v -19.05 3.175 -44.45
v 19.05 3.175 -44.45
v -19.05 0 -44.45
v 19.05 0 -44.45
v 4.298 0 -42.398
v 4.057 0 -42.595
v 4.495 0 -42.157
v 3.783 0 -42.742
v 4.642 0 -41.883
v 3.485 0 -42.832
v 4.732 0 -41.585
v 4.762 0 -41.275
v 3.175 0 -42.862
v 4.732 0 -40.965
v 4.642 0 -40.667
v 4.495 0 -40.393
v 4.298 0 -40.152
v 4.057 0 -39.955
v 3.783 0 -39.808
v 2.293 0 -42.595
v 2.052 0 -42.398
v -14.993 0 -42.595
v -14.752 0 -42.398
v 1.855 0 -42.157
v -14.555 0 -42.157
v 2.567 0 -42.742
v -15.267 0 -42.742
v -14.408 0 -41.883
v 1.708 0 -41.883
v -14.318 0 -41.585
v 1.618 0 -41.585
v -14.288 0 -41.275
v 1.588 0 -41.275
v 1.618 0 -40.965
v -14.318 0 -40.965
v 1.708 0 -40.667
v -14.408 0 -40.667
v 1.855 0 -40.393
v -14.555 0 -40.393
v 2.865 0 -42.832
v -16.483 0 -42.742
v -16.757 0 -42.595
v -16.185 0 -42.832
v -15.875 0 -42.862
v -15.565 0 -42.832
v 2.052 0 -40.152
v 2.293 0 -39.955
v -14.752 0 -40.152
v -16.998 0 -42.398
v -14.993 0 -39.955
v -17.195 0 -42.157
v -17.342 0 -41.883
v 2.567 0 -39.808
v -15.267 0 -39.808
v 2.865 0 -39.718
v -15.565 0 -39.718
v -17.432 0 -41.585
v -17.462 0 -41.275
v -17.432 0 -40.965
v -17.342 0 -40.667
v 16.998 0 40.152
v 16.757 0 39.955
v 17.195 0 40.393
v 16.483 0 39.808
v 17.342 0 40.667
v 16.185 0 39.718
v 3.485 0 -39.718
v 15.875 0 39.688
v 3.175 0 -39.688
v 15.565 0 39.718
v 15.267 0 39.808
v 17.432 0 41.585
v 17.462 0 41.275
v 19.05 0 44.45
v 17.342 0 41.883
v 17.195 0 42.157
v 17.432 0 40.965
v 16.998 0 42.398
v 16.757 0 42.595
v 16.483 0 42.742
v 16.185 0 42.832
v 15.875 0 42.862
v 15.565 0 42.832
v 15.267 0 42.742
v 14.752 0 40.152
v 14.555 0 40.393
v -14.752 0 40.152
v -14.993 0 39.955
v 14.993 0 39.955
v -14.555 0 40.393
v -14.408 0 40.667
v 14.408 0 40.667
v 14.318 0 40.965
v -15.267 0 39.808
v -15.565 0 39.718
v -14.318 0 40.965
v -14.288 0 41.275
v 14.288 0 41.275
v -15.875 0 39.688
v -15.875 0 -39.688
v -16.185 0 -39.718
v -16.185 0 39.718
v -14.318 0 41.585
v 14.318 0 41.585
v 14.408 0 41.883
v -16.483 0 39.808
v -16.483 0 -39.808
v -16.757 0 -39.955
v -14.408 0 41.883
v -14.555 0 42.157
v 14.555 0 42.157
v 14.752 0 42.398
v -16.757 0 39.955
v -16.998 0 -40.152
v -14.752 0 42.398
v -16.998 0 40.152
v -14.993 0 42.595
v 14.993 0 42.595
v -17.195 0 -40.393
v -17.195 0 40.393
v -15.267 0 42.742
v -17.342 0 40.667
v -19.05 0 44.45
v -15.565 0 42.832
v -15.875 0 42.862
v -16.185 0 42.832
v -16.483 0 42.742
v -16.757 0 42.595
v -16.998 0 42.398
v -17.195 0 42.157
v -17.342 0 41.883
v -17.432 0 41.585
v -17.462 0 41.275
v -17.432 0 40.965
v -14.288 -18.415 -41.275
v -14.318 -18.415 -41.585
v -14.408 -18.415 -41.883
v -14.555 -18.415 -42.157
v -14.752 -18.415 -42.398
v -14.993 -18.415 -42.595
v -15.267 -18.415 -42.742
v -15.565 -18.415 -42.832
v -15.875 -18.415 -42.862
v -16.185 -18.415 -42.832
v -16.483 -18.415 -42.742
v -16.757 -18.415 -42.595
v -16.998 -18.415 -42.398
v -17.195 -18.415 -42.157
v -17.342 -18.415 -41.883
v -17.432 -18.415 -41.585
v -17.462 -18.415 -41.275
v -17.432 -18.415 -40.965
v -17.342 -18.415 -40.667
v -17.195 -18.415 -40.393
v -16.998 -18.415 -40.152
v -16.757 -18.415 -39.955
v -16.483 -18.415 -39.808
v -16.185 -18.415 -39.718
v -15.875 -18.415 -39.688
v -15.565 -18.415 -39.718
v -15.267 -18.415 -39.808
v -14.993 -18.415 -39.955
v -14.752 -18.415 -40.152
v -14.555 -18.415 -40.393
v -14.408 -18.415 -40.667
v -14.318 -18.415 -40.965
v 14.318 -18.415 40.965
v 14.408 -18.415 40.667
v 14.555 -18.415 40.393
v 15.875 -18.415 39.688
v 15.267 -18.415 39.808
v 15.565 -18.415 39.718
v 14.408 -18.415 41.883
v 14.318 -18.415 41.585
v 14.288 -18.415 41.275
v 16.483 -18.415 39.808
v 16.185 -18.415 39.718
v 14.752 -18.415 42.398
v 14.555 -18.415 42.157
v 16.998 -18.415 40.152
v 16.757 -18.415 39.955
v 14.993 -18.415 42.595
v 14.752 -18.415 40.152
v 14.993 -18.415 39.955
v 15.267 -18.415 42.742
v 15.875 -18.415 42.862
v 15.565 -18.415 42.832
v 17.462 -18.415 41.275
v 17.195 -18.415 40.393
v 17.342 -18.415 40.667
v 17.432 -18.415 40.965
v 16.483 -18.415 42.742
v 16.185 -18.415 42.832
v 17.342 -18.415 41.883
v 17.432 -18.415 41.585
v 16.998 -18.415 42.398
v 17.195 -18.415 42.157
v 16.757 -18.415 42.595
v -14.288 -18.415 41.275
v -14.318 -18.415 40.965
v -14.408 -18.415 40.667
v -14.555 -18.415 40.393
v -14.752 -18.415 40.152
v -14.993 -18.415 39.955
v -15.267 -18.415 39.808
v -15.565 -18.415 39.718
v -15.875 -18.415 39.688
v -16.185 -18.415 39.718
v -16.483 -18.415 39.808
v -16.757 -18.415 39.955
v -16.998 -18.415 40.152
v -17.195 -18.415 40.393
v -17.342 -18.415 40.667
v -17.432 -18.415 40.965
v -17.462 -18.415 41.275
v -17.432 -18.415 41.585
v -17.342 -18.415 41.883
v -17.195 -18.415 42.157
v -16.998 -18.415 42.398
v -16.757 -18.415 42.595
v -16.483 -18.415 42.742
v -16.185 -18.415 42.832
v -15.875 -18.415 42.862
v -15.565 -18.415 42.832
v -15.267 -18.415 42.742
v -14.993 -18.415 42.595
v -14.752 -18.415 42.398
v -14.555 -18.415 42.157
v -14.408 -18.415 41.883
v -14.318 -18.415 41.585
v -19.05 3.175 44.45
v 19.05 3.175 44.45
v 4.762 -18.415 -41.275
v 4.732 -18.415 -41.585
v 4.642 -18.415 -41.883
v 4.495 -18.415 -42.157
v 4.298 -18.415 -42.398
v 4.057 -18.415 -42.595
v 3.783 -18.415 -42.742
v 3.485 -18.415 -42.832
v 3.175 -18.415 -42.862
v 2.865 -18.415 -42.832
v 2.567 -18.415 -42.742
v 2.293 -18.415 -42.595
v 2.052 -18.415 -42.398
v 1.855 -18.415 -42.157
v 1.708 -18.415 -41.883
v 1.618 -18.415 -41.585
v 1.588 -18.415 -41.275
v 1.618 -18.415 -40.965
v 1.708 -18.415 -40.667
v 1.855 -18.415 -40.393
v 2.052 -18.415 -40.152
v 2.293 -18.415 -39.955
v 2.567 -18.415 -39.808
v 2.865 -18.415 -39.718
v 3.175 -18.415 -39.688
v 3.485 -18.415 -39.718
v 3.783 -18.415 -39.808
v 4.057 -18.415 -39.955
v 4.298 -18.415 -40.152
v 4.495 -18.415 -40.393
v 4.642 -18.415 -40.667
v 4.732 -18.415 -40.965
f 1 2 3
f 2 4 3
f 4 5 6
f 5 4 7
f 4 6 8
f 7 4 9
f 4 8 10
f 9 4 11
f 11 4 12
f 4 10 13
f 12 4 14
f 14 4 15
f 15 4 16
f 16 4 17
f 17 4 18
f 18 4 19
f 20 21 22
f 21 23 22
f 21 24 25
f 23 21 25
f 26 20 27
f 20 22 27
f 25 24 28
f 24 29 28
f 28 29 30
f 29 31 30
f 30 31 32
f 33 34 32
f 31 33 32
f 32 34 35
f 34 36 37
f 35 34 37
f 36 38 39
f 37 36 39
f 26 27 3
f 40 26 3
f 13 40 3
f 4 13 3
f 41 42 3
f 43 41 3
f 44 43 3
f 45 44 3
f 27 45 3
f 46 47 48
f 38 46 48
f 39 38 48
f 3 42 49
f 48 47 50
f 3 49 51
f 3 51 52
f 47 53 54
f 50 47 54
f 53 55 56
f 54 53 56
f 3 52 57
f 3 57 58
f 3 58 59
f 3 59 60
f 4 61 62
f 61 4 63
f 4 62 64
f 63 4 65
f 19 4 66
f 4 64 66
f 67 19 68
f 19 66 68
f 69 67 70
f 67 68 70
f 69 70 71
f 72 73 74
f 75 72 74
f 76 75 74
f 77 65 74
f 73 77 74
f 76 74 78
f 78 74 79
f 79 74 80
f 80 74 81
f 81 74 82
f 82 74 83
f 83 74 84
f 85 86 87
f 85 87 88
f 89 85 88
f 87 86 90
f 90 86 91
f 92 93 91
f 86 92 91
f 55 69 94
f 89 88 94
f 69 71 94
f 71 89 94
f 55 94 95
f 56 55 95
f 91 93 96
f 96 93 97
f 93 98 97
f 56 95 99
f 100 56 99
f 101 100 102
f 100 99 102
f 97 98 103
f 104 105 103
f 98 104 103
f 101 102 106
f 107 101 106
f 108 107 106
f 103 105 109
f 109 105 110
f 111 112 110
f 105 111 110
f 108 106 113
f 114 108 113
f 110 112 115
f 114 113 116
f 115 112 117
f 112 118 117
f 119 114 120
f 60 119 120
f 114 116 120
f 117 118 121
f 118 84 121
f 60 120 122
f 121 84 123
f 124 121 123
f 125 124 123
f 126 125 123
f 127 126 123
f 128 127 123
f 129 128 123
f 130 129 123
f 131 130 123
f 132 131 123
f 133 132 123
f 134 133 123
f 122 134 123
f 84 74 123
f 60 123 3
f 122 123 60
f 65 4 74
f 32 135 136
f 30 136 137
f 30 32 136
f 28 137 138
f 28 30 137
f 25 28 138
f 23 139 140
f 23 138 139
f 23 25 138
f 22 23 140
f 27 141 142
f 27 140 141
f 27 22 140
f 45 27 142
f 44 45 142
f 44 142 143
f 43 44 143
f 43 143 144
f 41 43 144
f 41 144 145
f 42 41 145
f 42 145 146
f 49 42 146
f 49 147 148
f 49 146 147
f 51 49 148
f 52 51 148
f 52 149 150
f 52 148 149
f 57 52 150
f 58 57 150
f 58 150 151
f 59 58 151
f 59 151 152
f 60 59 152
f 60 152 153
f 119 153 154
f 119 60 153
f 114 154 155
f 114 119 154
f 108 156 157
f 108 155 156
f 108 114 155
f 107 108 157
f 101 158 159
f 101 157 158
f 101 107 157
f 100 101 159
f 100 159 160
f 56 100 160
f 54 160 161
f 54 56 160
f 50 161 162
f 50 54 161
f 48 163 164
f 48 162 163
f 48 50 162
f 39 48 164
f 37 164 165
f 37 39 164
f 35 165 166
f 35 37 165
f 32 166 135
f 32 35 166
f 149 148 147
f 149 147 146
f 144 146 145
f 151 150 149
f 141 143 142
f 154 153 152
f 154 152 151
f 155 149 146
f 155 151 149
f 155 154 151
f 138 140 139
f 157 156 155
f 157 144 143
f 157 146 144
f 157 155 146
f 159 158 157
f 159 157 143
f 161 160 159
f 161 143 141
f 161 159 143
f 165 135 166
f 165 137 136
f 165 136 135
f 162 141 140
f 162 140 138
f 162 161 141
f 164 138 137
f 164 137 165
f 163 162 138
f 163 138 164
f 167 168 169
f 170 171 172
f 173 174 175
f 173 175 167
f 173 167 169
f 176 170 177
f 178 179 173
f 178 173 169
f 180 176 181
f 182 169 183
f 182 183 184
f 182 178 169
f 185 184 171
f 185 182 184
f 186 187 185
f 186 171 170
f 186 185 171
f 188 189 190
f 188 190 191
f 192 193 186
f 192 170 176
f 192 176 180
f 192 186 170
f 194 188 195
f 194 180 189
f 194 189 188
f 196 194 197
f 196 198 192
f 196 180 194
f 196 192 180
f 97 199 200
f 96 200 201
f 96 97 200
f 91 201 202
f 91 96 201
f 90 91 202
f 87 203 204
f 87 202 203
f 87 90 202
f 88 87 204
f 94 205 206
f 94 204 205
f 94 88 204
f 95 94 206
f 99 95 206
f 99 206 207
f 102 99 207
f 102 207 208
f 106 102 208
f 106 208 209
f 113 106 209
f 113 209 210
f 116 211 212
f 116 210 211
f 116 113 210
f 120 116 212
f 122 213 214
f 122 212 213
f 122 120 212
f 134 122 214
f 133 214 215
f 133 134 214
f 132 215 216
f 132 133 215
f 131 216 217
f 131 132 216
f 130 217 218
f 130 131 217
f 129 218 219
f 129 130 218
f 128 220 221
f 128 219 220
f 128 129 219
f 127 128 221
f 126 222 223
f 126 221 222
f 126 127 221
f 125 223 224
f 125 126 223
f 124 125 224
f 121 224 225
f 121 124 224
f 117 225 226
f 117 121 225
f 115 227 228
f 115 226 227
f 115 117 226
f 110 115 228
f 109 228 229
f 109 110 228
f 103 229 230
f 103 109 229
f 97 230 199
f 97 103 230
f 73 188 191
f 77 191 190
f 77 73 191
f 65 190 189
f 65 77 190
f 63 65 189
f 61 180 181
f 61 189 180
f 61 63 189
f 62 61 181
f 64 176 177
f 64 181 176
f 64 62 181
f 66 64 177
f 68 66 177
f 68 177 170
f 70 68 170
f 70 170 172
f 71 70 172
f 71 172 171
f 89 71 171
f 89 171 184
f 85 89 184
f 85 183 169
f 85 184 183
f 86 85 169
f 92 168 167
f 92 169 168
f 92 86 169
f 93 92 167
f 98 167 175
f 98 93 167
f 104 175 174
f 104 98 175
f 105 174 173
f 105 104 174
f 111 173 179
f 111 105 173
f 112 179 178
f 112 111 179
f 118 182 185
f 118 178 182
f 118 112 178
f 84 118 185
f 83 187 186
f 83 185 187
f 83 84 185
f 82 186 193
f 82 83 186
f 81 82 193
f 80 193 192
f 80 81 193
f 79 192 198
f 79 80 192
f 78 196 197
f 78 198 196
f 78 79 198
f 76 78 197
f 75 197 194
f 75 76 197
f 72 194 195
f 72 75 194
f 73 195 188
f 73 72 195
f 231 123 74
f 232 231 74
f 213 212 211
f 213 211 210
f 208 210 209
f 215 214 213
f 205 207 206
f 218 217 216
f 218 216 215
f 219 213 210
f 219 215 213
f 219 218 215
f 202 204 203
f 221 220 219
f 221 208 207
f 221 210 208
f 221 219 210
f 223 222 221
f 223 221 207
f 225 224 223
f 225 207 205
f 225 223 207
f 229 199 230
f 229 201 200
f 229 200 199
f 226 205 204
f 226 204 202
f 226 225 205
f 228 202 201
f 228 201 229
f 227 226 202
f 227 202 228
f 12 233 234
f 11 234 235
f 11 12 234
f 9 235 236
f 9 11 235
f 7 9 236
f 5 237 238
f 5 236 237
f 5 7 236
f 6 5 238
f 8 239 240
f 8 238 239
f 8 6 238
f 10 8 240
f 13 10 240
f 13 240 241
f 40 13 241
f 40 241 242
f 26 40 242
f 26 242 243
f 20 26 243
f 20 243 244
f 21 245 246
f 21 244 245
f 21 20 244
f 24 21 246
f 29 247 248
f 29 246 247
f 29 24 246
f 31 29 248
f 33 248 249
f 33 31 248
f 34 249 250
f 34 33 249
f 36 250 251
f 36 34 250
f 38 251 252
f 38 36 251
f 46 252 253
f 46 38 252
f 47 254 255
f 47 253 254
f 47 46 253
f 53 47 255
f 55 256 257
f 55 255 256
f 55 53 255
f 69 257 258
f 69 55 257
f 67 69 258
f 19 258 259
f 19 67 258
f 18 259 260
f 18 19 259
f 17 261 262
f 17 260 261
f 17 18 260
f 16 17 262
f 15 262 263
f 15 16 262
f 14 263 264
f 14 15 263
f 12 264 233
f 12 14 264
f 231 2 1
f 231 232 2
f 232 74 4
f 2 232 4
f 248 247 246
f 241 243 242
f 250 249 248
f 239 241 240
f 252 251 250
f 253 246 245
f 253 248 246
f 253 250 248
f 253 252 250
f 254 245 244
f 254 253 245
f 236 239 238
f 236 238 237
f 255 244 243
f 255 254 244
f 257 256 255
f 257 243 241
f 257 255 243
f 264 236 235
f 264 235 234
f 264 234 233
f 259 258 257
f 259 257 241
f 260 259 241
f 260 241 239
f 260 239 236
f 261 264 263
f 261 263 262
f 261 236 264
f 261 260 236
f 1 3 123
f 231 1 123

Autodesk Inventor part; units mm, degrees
ref_plane "YZ Plane" through (0, 0, 0) normal (1, 0, 0) x (0, 1, 0)
ref_plane "XZ Plane" through (0, 0, 0) normal (0, 1, 0) x (-1, 0, 0)
ref_plane "XY Plane" through (0, 0, 0) normal (0, 0, 1) x (1, 0, 0)
sketch "Sketch1" plane through (0, 0, 0) normal (0, 1, 0) x (-1, 0, 0)
  line L0 (19.05, 44.45) -> (-19.05, 44.45)
  line L1 (-19.05, 44.45) -> (-19.05, -44.45)
  line L2 (-19.05, -44.45) -> (19.05, -44.45)
  line L3 (19.05, -44.45) -> (19.05, 44.45)
  circle A0 centre (11.5, 29) radius 1.375 construction
  circle A1 centre (11.5, -29) radius 1.375 construction
  circle A2 centre (-11.5, 29) radius 1.375 construction
  circle A3 centre (-11.5, -29) radius 1.375 construction
  point P0 (0, 0)
  dimension "d0" = 88.9
  dimension "d1" = 38.1
  dimension "d2" = 19.05
  dimension "d3" = 44.45
  dimension "d4" = 2.75
  dimension "d5" = 2.75
  dimension "d6" = 2.75
  dimension "d7" = 2.75
  dimension "d8" = 58
  dimension "d9" = 58
  dimension "d10" = 23
  dimension "d11" = 11.5
  dimension "d12" = 29
  dimension "d13" = 29
  dimension "d14" = 23
  dimension "d15" = 11.5
extrude "Extrusion1" add sketch "Sketch1" along normal blind 3.175
sketch "Sketch2" plane through (0, 0, 0) normal (0, -1, 0) x (1, 0, 0)
  circle A0 centre (15.875, 41.275) radius 1.5875
  circle A1 centre (-15.875, 41.275) radius 1.5875
  circle A2 centre (-15.875, -41.275) radius 1.5875
  circle A3 centre (3.175, -41.275) radius 1.5875
  line L0 (-19.05, 44.45) -> (19.05, 44.45) projected
  line L1 (-19.05, -44.45) -> (-19.05, 44.45) projected
  line L2 (19.05, 44.45) -> (19.05, -44.45) projected
  line L3 (19.05, -44.45) -> (-19.05, -44.45) projected
  point P0 (0, 0)
  dimension "d18" = 3.175
  dimension "d19" = 3.175
  dimension "d20" = 3.175
  dimension "d21" = 3.175
  dimension "d22" = 15.875
  dimension "d23" = 3.175
  dimension "d24" = 3.175
  dimension "d25" = 3.175
  dimension "d26" = 3.175
  dimension "d27" = 3.175
  dimension "d28" = 3.175
  dimension "d29" = 3.175
extrude "Extrusion2" add sketch "Sketch2" along normal blind 18.415 contours A0 | A1 | A2 | A3
sketch "Sketch3" plane through (0, 3.175, 0) normal (0, 1, 0) x (1, 0, 0)
  circle A0 centre (-14.2875, 17.5562) radius 1.6764
  circle A1 centre (-14.2875, 31.75) radius 1.6764
  line L0 (19.05, -44.45) -> (19.05, 44.45) projected
  line L1 (-19.05, -44.45) -> (19.05, -44.45) projected
  line L2 (-14.2875, 31.75) -> (-14.2875, 17.5562) construction
  line L3 (-19.05, 44.45) -> (-19.05, -44.45) projected
  line L4 (19.05, 44.45) -> (-19.05, 44.45) projected
  point P0 (0, 0)
  dimension "d32" = 3.3528
  dimension "d33" = 3.3528
  dimension "d34" = 14.1938
  dimension "d39" = 4.7625
  dimension "d40" = 12.7
extrude "Extrusion3" [suppressed]
equation "\"d2\" = 0.5 * d1"
equation "\"d3\" = 0.5 * d0"
equation "\"d5\" = d4"
equation "\"d6\" = d4"
equation "\"d7\" = d4"
equation "\"d9\" = d8"
equation "\"d11\" = 0.5 * d10"
equation "\"d12\" = 0.5 * d8"
equation "\"d13\" = 0.5 * d9"
equation "\"d14\" = d10"
equation "\"d15\" = 0.5 * d14"
equation "\"d19\" = d18"
equation "\"d20\" = d21"
equation "\"d23\" = d18"
equation "\"d24\" = d18"
equation "\"d25\" = d21"
equation "\"d27\" = d26"
equation "\"d28\" = d26"
equation "\"d29\" = d26"
equation "\"d32\" = d33"
properties part number "Pi Holder Mk2" material "Aluminum 6061"
